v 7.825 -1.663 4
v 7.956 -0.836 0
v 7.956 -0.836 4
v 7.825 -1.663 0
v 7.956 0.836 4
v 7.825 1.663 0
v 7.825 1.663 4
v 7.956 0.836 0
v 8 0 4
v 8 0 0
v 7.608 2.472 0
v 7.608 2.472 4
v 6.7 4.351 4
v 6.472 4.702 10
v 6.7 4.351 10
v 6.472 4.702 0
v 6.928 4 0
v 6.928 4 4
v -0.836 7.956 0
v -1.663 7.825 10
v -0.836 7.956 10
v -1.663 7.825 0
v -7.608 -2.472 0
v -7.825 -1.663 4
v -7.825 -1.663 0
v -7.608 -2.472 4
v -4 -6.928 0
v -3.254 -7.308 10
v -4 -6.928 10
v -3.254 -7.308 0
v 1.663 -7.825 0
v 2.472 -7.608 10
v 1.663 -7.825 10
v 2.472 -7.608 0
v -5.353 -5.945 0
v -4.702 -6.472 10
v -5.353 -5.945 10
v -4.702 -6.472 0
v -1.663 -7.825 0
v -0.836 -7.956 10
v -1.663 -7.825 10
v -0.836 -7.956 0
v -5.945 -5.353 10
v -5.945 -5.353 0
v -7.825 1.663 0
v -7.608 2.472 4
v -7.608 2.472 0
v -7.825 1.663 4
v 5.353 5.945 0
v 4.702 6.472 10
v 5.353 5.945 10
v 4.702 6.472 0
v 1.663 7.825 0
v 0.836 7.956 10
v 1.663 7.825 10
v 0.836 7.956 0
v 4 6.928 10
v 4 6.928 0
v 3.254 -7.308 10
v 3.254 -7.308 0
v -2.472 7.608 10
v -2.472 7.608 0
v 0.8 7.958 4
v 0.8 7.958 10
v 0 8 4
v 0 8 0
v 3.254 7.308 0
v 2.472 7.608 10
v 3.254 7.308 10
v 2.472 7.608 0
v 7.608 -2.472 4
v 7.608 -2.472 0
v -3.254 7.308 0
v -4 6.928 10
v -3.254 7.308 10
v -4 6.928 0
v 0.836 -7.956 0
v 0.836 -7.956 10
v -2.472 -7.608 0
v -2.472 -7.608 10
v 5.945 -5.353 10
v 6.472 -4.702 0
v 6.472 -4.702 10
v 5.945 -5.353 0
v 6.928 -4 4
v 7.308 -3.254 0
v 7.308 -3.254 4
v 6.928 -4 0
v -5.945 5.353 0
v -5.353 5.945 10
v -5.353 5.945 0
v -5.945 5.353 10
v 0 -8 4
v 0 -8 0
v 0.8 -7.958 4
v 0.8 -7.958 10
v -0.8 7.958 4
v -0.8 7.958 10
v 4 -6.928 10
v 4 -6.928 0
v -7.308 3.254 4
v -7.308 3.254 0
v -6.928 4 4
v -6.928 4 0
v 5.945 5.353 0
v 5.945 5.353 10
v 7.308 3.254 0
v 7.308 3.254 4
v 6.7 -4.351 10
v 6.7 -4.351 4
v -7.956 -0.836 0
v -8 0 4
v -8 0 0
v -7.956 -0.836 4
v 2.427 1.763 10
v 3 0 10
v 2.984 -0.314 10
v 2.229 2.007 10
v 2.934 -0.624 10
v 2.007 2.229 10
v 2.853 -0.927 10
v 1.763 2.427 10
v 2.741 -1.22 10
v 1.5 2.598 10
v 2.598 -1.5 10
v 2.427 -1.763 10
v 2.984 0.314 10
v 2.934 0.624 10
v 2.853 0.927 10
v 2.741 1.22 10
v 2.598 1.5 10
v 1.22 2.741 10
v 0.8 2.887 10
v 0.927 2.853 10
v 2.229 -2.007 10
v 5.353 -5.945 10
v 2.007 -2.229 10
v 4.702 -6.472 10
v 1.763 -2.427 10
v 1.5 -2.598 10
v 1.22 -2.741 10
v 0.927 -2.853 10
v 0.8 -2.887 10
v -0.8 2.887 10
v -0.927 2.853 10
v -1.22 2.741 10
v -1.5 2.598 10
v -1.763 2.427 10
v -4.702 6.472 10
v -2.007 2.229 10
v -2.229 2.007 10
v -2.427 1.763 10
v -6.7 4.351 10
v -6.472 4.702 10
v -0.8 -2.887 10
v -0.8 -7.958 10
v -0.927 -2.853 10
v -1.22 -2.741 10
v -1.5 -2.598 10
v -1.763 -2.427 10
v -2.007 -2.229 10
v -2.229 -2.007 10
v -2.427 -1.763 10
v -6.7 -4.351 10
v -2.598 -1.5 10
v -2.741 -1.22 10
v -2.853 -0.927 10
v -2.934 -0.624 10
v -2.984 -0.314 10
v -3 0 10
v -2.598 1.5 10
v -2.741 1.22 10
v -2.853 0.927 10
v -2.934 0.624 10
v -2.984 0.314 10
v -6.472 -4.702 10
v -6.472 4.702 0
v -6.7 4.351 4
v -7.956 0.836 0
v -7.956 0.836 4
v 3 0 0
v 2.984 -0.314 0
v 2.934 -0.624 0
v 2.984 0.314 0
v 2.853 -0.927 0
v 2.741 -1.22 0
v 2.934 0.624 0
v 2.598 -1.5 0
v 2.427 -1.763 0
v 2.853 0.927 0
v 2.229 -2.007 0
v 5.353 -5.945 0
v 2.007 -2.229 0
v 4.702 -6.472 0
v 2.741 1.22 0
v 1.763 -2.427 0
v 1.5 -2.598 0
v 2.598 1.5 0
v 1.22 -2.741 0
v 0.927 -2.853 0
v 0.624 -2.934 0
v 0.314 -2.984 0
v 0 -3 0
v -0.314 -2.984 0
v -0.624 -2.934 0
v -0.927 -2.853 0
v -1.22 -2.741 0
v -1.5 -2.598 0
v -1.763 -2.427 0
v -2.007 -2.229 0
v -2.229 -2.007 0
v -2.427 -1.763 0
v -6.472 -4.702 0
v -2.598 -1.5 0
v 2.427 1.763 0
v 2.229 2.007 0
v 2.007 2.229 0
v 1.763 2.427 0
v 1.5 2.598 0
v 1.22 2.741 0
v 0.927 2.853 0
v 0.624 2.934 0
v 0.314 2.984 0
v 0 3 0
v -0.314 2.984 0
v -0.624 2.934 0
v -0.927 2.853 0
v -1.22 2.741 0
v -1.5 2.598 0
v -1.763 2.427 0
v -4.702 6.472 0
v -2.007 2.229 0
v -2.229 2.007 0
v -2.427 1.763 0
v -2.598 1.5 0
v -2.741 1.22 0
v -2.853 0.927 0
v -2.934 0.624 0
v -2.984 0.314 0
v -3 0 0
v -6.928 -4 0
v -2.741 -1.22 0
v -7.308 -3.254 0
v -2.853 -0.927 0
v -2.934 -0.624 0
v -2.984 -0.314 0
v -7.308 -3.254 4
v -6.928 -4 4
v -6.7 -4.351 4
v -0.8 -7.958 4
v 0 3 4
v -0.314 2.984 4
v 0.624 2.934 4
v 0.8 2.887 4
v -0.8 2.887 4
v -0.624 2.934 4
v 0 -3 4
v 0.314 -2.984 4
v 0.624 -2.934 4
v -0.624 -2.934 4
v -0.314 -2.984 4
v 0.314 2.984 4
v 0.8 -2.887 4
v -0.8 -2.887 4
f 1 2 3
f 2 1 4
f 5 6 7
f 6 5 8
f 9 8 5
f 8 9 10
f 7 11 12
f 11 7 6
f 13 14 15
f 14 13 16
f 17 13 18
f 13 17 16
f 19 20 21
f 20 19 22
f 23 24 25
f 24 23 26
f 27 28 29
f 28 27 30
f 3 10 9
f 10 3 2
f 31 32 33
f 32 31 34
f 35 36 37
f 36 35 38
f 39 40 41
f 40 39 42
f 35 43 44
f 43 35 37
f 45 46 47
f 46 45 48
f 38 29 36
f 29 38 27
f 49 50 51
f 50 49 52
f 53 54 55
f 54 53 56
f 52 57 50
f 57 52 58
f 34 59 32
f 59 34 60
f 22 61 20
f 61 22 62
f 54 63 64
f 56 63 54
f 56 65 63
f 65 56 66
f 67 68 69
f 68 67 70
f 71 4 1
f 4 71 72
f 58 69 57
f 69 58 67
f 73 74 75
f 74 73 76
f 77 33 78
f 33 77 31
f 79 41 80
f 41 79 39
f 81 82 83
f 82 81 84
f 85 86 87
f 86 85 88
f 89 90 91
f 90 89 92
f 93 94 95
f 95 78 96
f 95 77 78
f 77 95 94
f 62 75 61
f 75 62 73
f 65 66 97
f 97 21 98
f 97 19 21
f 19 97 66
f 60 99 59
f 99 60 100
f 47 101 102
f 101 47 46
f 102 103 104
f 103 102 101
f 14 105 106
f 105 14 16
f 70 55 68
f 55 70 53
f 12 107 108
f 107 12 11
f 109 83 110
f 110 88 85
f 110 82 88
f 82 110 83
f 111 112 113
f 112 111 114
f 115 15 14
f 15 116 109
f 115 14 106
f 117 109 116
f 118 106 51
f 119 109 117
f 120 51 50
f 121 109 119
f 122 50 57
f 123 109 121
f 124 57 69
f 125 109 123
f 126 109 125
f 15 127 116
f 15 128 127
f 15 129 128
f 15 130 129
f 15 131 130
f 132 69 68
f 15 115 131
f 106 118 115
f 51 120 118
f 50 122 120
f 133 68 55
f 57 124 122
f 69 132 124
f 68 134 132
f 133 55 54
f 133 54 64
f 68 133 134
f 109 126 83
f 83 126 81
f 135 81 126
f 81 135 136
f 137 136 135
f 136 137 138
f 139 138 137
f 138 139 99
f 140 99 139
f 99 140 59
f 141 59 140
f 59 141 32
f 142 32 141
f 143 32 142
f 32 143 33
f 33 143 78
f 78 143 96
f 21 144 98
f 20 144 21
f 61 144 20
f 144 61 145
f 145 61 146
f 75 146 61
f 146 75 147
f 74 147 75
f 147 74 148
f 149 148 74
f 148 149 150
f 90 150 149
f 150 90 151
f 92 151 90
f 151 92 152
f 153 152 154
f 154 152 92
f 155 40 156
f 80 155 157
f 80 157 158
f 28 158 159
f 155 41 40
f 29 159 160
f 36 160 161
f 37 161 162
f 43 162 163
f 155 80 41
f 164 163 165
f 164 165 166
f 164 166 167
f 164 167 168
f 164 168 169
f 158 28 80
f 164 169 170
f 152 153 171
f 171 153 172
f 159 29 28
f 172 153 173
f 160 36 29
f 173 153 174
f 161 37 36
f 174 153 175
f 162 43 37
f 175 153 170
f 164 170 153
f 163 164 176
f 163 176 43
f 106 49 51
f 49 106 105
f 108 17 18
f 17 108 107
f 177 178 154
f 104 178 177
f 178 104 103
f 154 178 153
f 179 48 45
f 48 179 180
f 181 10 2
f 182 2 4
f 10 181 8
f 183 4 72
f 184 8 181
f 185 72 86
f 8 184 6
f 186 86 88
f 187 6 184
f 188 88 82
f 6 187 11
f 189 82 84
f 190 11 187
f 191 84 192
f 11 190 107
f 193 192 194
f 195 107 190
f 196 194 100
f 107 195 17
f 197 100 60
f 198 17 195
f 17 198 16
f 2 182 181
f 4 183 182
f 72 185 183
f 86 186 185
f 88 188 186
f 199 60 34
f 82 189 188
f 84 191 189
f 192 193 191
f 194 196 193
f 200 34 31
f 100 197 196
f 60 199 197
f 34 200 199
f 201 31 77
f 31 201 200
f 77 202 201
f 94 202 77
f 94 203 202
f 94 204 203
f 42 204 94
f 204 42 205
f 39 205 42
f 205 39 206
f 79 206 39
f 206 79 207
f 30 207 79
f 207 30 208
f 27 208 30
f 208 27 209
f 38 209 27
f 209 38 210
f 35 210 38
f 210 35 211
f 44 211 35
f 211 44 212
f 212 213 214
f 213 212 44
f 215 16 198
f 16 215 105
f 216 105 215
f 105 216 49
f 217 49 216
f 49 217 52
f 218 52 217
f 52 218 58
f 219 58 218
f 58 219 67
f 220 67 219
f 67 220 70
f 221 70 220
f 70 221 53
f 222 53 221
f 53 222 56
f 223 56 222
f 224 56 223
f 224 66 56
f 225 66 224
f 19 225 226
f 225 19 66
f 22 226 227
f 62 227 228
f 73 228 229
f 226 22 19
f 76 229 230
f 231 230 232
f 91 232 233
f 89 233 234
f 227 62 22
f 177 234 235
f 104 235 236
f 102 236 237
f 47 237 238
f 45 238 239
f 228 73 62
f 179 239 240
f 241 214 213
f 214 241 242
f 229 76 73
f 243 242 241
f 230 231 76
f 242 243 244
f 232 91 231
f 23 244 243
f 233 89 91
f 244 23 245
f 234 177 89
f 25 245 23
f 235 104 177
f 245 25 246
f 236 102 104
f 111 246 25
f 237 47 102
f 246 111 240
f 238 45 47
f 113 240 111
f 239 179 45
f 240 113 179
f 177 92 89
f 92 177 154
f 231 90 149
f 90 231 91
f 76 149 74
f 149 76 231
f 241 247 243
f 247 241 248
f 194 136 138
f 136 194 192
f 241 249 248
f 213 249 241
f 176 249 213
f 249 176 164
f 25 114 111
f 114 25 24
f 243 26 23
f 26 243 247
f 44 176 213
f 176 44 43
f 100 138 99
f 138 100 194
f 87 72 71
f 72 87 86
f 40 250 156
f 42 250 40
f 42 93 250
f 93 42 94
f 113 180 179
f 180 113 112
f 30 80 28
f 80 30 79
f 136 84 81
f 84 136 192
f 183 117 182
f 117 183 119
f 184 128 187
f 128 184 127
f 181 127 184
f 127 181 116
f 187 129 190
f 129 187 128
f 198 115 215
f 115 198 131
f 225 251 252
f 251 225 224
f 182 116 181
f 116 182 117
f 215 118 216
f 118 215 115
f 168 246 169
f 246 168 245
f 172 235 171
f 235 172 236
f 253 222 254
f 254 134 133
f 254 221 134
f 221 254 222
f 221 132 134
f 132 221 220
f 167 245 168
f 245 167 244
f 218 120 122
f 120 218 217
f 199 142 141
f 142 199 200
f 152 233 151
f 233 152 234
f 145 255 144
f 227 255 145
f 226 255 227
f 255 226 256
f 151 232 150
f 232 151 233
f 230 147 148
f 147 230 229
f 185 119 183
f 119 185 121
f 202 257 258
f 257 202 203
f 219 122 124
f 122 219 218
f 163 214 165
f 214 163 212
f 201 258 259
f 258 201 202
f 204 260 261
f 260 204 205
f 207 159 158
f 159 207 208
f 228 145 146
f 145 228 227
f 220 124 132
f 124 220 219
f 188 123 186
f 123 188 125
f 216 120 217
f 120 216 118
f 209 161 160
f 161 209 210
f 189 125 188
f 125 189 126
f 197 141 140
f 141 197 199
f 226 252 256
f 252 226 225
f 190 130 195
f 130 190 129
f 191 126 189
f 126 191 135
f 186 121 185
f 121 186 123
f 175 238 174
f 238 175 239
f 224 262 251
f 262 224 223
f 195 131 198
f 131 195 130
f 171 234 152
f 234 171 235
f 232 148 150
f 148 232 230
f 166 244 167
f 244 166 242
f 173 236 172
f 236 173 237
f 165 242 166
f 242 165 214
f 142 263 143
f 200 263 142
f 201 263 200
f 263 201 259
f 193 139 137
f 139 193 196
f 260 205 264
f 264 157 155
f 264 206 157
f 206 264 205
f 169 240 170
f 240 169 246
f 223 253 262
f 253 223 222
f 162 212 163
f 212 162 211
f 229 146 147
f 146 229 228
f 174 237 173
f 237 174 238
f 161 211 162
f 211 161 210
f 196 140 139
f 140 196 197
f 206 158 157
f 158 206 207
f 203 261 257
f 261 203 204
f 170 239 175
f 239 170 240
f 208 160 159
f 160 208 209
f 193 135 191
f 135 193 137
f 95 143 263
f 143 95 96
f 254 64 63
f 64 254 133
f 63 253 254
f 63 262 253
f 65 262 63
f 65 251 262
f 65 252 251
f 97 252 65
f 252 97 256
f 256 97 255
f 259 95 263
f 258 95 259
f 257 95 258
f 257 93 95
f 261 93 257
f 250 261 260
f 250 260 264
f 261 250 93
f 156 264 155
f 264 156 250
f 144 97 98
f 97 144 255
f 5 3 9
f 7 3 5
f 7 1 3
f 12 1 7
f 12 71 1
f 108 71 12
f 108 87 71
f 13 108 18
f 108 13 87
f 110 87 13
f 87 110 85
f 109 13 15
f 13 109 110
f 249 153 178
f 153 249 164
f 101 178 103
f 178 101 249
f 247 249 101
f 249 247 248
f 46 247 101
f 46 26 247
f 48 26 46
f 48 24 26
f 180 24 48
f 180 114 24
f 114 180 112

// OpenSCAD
/*I made this part to check customizer and play with openscad.
*It is based on this: http://www.thingiverse.com/thing:36240 from Petehagoras
*The dimensions for the holes are taken from jonaskuehling's openscad
* model http://www.thingiverse.com/thing:18379 (Greg's Wade reloaded)
* The dimensions are tight, so i don't know if it will work out of the box.
*Wade's to bowden cable by cr3a7ure
*I'm not familiar with licences so i'll keep the original
*/

bowden_cable_diameter = 6;// [6:3mm_Filament,4:1.75mm_Filament,3.5:Fill_that_hole]
hotend_mount_hole = 16; //[16:J_head_or_grrf_peek,12.7:Wildseyed_mount_or_Mendel_parts_v6,15:geared_extruder,10:reprapfab.org]
hole_height = 10; // [10:what_you_want,20:reprapfab.org]


difference(){
cylinder(r=hotend_mount_hole/2,h=hole_height,$fn=60);
cylinder(r=bowden_cable_diameter/2,h=hole_height,$fn=60);
translate([-1.6/2,-hotend_mount_hole/2,4]) cube([1.6,hotend_mount_hole,16]);
translate([-1.3+hotend_mount_hole/2,-hotend_mount_hole/2,4]) cube([1.3,hotend_mount_hole,16]);
translate([-hotend_mount_hole/2,-hotend_mount_hole/2,4]) cube([1.3,hotend_mount_hole,16]);
}
